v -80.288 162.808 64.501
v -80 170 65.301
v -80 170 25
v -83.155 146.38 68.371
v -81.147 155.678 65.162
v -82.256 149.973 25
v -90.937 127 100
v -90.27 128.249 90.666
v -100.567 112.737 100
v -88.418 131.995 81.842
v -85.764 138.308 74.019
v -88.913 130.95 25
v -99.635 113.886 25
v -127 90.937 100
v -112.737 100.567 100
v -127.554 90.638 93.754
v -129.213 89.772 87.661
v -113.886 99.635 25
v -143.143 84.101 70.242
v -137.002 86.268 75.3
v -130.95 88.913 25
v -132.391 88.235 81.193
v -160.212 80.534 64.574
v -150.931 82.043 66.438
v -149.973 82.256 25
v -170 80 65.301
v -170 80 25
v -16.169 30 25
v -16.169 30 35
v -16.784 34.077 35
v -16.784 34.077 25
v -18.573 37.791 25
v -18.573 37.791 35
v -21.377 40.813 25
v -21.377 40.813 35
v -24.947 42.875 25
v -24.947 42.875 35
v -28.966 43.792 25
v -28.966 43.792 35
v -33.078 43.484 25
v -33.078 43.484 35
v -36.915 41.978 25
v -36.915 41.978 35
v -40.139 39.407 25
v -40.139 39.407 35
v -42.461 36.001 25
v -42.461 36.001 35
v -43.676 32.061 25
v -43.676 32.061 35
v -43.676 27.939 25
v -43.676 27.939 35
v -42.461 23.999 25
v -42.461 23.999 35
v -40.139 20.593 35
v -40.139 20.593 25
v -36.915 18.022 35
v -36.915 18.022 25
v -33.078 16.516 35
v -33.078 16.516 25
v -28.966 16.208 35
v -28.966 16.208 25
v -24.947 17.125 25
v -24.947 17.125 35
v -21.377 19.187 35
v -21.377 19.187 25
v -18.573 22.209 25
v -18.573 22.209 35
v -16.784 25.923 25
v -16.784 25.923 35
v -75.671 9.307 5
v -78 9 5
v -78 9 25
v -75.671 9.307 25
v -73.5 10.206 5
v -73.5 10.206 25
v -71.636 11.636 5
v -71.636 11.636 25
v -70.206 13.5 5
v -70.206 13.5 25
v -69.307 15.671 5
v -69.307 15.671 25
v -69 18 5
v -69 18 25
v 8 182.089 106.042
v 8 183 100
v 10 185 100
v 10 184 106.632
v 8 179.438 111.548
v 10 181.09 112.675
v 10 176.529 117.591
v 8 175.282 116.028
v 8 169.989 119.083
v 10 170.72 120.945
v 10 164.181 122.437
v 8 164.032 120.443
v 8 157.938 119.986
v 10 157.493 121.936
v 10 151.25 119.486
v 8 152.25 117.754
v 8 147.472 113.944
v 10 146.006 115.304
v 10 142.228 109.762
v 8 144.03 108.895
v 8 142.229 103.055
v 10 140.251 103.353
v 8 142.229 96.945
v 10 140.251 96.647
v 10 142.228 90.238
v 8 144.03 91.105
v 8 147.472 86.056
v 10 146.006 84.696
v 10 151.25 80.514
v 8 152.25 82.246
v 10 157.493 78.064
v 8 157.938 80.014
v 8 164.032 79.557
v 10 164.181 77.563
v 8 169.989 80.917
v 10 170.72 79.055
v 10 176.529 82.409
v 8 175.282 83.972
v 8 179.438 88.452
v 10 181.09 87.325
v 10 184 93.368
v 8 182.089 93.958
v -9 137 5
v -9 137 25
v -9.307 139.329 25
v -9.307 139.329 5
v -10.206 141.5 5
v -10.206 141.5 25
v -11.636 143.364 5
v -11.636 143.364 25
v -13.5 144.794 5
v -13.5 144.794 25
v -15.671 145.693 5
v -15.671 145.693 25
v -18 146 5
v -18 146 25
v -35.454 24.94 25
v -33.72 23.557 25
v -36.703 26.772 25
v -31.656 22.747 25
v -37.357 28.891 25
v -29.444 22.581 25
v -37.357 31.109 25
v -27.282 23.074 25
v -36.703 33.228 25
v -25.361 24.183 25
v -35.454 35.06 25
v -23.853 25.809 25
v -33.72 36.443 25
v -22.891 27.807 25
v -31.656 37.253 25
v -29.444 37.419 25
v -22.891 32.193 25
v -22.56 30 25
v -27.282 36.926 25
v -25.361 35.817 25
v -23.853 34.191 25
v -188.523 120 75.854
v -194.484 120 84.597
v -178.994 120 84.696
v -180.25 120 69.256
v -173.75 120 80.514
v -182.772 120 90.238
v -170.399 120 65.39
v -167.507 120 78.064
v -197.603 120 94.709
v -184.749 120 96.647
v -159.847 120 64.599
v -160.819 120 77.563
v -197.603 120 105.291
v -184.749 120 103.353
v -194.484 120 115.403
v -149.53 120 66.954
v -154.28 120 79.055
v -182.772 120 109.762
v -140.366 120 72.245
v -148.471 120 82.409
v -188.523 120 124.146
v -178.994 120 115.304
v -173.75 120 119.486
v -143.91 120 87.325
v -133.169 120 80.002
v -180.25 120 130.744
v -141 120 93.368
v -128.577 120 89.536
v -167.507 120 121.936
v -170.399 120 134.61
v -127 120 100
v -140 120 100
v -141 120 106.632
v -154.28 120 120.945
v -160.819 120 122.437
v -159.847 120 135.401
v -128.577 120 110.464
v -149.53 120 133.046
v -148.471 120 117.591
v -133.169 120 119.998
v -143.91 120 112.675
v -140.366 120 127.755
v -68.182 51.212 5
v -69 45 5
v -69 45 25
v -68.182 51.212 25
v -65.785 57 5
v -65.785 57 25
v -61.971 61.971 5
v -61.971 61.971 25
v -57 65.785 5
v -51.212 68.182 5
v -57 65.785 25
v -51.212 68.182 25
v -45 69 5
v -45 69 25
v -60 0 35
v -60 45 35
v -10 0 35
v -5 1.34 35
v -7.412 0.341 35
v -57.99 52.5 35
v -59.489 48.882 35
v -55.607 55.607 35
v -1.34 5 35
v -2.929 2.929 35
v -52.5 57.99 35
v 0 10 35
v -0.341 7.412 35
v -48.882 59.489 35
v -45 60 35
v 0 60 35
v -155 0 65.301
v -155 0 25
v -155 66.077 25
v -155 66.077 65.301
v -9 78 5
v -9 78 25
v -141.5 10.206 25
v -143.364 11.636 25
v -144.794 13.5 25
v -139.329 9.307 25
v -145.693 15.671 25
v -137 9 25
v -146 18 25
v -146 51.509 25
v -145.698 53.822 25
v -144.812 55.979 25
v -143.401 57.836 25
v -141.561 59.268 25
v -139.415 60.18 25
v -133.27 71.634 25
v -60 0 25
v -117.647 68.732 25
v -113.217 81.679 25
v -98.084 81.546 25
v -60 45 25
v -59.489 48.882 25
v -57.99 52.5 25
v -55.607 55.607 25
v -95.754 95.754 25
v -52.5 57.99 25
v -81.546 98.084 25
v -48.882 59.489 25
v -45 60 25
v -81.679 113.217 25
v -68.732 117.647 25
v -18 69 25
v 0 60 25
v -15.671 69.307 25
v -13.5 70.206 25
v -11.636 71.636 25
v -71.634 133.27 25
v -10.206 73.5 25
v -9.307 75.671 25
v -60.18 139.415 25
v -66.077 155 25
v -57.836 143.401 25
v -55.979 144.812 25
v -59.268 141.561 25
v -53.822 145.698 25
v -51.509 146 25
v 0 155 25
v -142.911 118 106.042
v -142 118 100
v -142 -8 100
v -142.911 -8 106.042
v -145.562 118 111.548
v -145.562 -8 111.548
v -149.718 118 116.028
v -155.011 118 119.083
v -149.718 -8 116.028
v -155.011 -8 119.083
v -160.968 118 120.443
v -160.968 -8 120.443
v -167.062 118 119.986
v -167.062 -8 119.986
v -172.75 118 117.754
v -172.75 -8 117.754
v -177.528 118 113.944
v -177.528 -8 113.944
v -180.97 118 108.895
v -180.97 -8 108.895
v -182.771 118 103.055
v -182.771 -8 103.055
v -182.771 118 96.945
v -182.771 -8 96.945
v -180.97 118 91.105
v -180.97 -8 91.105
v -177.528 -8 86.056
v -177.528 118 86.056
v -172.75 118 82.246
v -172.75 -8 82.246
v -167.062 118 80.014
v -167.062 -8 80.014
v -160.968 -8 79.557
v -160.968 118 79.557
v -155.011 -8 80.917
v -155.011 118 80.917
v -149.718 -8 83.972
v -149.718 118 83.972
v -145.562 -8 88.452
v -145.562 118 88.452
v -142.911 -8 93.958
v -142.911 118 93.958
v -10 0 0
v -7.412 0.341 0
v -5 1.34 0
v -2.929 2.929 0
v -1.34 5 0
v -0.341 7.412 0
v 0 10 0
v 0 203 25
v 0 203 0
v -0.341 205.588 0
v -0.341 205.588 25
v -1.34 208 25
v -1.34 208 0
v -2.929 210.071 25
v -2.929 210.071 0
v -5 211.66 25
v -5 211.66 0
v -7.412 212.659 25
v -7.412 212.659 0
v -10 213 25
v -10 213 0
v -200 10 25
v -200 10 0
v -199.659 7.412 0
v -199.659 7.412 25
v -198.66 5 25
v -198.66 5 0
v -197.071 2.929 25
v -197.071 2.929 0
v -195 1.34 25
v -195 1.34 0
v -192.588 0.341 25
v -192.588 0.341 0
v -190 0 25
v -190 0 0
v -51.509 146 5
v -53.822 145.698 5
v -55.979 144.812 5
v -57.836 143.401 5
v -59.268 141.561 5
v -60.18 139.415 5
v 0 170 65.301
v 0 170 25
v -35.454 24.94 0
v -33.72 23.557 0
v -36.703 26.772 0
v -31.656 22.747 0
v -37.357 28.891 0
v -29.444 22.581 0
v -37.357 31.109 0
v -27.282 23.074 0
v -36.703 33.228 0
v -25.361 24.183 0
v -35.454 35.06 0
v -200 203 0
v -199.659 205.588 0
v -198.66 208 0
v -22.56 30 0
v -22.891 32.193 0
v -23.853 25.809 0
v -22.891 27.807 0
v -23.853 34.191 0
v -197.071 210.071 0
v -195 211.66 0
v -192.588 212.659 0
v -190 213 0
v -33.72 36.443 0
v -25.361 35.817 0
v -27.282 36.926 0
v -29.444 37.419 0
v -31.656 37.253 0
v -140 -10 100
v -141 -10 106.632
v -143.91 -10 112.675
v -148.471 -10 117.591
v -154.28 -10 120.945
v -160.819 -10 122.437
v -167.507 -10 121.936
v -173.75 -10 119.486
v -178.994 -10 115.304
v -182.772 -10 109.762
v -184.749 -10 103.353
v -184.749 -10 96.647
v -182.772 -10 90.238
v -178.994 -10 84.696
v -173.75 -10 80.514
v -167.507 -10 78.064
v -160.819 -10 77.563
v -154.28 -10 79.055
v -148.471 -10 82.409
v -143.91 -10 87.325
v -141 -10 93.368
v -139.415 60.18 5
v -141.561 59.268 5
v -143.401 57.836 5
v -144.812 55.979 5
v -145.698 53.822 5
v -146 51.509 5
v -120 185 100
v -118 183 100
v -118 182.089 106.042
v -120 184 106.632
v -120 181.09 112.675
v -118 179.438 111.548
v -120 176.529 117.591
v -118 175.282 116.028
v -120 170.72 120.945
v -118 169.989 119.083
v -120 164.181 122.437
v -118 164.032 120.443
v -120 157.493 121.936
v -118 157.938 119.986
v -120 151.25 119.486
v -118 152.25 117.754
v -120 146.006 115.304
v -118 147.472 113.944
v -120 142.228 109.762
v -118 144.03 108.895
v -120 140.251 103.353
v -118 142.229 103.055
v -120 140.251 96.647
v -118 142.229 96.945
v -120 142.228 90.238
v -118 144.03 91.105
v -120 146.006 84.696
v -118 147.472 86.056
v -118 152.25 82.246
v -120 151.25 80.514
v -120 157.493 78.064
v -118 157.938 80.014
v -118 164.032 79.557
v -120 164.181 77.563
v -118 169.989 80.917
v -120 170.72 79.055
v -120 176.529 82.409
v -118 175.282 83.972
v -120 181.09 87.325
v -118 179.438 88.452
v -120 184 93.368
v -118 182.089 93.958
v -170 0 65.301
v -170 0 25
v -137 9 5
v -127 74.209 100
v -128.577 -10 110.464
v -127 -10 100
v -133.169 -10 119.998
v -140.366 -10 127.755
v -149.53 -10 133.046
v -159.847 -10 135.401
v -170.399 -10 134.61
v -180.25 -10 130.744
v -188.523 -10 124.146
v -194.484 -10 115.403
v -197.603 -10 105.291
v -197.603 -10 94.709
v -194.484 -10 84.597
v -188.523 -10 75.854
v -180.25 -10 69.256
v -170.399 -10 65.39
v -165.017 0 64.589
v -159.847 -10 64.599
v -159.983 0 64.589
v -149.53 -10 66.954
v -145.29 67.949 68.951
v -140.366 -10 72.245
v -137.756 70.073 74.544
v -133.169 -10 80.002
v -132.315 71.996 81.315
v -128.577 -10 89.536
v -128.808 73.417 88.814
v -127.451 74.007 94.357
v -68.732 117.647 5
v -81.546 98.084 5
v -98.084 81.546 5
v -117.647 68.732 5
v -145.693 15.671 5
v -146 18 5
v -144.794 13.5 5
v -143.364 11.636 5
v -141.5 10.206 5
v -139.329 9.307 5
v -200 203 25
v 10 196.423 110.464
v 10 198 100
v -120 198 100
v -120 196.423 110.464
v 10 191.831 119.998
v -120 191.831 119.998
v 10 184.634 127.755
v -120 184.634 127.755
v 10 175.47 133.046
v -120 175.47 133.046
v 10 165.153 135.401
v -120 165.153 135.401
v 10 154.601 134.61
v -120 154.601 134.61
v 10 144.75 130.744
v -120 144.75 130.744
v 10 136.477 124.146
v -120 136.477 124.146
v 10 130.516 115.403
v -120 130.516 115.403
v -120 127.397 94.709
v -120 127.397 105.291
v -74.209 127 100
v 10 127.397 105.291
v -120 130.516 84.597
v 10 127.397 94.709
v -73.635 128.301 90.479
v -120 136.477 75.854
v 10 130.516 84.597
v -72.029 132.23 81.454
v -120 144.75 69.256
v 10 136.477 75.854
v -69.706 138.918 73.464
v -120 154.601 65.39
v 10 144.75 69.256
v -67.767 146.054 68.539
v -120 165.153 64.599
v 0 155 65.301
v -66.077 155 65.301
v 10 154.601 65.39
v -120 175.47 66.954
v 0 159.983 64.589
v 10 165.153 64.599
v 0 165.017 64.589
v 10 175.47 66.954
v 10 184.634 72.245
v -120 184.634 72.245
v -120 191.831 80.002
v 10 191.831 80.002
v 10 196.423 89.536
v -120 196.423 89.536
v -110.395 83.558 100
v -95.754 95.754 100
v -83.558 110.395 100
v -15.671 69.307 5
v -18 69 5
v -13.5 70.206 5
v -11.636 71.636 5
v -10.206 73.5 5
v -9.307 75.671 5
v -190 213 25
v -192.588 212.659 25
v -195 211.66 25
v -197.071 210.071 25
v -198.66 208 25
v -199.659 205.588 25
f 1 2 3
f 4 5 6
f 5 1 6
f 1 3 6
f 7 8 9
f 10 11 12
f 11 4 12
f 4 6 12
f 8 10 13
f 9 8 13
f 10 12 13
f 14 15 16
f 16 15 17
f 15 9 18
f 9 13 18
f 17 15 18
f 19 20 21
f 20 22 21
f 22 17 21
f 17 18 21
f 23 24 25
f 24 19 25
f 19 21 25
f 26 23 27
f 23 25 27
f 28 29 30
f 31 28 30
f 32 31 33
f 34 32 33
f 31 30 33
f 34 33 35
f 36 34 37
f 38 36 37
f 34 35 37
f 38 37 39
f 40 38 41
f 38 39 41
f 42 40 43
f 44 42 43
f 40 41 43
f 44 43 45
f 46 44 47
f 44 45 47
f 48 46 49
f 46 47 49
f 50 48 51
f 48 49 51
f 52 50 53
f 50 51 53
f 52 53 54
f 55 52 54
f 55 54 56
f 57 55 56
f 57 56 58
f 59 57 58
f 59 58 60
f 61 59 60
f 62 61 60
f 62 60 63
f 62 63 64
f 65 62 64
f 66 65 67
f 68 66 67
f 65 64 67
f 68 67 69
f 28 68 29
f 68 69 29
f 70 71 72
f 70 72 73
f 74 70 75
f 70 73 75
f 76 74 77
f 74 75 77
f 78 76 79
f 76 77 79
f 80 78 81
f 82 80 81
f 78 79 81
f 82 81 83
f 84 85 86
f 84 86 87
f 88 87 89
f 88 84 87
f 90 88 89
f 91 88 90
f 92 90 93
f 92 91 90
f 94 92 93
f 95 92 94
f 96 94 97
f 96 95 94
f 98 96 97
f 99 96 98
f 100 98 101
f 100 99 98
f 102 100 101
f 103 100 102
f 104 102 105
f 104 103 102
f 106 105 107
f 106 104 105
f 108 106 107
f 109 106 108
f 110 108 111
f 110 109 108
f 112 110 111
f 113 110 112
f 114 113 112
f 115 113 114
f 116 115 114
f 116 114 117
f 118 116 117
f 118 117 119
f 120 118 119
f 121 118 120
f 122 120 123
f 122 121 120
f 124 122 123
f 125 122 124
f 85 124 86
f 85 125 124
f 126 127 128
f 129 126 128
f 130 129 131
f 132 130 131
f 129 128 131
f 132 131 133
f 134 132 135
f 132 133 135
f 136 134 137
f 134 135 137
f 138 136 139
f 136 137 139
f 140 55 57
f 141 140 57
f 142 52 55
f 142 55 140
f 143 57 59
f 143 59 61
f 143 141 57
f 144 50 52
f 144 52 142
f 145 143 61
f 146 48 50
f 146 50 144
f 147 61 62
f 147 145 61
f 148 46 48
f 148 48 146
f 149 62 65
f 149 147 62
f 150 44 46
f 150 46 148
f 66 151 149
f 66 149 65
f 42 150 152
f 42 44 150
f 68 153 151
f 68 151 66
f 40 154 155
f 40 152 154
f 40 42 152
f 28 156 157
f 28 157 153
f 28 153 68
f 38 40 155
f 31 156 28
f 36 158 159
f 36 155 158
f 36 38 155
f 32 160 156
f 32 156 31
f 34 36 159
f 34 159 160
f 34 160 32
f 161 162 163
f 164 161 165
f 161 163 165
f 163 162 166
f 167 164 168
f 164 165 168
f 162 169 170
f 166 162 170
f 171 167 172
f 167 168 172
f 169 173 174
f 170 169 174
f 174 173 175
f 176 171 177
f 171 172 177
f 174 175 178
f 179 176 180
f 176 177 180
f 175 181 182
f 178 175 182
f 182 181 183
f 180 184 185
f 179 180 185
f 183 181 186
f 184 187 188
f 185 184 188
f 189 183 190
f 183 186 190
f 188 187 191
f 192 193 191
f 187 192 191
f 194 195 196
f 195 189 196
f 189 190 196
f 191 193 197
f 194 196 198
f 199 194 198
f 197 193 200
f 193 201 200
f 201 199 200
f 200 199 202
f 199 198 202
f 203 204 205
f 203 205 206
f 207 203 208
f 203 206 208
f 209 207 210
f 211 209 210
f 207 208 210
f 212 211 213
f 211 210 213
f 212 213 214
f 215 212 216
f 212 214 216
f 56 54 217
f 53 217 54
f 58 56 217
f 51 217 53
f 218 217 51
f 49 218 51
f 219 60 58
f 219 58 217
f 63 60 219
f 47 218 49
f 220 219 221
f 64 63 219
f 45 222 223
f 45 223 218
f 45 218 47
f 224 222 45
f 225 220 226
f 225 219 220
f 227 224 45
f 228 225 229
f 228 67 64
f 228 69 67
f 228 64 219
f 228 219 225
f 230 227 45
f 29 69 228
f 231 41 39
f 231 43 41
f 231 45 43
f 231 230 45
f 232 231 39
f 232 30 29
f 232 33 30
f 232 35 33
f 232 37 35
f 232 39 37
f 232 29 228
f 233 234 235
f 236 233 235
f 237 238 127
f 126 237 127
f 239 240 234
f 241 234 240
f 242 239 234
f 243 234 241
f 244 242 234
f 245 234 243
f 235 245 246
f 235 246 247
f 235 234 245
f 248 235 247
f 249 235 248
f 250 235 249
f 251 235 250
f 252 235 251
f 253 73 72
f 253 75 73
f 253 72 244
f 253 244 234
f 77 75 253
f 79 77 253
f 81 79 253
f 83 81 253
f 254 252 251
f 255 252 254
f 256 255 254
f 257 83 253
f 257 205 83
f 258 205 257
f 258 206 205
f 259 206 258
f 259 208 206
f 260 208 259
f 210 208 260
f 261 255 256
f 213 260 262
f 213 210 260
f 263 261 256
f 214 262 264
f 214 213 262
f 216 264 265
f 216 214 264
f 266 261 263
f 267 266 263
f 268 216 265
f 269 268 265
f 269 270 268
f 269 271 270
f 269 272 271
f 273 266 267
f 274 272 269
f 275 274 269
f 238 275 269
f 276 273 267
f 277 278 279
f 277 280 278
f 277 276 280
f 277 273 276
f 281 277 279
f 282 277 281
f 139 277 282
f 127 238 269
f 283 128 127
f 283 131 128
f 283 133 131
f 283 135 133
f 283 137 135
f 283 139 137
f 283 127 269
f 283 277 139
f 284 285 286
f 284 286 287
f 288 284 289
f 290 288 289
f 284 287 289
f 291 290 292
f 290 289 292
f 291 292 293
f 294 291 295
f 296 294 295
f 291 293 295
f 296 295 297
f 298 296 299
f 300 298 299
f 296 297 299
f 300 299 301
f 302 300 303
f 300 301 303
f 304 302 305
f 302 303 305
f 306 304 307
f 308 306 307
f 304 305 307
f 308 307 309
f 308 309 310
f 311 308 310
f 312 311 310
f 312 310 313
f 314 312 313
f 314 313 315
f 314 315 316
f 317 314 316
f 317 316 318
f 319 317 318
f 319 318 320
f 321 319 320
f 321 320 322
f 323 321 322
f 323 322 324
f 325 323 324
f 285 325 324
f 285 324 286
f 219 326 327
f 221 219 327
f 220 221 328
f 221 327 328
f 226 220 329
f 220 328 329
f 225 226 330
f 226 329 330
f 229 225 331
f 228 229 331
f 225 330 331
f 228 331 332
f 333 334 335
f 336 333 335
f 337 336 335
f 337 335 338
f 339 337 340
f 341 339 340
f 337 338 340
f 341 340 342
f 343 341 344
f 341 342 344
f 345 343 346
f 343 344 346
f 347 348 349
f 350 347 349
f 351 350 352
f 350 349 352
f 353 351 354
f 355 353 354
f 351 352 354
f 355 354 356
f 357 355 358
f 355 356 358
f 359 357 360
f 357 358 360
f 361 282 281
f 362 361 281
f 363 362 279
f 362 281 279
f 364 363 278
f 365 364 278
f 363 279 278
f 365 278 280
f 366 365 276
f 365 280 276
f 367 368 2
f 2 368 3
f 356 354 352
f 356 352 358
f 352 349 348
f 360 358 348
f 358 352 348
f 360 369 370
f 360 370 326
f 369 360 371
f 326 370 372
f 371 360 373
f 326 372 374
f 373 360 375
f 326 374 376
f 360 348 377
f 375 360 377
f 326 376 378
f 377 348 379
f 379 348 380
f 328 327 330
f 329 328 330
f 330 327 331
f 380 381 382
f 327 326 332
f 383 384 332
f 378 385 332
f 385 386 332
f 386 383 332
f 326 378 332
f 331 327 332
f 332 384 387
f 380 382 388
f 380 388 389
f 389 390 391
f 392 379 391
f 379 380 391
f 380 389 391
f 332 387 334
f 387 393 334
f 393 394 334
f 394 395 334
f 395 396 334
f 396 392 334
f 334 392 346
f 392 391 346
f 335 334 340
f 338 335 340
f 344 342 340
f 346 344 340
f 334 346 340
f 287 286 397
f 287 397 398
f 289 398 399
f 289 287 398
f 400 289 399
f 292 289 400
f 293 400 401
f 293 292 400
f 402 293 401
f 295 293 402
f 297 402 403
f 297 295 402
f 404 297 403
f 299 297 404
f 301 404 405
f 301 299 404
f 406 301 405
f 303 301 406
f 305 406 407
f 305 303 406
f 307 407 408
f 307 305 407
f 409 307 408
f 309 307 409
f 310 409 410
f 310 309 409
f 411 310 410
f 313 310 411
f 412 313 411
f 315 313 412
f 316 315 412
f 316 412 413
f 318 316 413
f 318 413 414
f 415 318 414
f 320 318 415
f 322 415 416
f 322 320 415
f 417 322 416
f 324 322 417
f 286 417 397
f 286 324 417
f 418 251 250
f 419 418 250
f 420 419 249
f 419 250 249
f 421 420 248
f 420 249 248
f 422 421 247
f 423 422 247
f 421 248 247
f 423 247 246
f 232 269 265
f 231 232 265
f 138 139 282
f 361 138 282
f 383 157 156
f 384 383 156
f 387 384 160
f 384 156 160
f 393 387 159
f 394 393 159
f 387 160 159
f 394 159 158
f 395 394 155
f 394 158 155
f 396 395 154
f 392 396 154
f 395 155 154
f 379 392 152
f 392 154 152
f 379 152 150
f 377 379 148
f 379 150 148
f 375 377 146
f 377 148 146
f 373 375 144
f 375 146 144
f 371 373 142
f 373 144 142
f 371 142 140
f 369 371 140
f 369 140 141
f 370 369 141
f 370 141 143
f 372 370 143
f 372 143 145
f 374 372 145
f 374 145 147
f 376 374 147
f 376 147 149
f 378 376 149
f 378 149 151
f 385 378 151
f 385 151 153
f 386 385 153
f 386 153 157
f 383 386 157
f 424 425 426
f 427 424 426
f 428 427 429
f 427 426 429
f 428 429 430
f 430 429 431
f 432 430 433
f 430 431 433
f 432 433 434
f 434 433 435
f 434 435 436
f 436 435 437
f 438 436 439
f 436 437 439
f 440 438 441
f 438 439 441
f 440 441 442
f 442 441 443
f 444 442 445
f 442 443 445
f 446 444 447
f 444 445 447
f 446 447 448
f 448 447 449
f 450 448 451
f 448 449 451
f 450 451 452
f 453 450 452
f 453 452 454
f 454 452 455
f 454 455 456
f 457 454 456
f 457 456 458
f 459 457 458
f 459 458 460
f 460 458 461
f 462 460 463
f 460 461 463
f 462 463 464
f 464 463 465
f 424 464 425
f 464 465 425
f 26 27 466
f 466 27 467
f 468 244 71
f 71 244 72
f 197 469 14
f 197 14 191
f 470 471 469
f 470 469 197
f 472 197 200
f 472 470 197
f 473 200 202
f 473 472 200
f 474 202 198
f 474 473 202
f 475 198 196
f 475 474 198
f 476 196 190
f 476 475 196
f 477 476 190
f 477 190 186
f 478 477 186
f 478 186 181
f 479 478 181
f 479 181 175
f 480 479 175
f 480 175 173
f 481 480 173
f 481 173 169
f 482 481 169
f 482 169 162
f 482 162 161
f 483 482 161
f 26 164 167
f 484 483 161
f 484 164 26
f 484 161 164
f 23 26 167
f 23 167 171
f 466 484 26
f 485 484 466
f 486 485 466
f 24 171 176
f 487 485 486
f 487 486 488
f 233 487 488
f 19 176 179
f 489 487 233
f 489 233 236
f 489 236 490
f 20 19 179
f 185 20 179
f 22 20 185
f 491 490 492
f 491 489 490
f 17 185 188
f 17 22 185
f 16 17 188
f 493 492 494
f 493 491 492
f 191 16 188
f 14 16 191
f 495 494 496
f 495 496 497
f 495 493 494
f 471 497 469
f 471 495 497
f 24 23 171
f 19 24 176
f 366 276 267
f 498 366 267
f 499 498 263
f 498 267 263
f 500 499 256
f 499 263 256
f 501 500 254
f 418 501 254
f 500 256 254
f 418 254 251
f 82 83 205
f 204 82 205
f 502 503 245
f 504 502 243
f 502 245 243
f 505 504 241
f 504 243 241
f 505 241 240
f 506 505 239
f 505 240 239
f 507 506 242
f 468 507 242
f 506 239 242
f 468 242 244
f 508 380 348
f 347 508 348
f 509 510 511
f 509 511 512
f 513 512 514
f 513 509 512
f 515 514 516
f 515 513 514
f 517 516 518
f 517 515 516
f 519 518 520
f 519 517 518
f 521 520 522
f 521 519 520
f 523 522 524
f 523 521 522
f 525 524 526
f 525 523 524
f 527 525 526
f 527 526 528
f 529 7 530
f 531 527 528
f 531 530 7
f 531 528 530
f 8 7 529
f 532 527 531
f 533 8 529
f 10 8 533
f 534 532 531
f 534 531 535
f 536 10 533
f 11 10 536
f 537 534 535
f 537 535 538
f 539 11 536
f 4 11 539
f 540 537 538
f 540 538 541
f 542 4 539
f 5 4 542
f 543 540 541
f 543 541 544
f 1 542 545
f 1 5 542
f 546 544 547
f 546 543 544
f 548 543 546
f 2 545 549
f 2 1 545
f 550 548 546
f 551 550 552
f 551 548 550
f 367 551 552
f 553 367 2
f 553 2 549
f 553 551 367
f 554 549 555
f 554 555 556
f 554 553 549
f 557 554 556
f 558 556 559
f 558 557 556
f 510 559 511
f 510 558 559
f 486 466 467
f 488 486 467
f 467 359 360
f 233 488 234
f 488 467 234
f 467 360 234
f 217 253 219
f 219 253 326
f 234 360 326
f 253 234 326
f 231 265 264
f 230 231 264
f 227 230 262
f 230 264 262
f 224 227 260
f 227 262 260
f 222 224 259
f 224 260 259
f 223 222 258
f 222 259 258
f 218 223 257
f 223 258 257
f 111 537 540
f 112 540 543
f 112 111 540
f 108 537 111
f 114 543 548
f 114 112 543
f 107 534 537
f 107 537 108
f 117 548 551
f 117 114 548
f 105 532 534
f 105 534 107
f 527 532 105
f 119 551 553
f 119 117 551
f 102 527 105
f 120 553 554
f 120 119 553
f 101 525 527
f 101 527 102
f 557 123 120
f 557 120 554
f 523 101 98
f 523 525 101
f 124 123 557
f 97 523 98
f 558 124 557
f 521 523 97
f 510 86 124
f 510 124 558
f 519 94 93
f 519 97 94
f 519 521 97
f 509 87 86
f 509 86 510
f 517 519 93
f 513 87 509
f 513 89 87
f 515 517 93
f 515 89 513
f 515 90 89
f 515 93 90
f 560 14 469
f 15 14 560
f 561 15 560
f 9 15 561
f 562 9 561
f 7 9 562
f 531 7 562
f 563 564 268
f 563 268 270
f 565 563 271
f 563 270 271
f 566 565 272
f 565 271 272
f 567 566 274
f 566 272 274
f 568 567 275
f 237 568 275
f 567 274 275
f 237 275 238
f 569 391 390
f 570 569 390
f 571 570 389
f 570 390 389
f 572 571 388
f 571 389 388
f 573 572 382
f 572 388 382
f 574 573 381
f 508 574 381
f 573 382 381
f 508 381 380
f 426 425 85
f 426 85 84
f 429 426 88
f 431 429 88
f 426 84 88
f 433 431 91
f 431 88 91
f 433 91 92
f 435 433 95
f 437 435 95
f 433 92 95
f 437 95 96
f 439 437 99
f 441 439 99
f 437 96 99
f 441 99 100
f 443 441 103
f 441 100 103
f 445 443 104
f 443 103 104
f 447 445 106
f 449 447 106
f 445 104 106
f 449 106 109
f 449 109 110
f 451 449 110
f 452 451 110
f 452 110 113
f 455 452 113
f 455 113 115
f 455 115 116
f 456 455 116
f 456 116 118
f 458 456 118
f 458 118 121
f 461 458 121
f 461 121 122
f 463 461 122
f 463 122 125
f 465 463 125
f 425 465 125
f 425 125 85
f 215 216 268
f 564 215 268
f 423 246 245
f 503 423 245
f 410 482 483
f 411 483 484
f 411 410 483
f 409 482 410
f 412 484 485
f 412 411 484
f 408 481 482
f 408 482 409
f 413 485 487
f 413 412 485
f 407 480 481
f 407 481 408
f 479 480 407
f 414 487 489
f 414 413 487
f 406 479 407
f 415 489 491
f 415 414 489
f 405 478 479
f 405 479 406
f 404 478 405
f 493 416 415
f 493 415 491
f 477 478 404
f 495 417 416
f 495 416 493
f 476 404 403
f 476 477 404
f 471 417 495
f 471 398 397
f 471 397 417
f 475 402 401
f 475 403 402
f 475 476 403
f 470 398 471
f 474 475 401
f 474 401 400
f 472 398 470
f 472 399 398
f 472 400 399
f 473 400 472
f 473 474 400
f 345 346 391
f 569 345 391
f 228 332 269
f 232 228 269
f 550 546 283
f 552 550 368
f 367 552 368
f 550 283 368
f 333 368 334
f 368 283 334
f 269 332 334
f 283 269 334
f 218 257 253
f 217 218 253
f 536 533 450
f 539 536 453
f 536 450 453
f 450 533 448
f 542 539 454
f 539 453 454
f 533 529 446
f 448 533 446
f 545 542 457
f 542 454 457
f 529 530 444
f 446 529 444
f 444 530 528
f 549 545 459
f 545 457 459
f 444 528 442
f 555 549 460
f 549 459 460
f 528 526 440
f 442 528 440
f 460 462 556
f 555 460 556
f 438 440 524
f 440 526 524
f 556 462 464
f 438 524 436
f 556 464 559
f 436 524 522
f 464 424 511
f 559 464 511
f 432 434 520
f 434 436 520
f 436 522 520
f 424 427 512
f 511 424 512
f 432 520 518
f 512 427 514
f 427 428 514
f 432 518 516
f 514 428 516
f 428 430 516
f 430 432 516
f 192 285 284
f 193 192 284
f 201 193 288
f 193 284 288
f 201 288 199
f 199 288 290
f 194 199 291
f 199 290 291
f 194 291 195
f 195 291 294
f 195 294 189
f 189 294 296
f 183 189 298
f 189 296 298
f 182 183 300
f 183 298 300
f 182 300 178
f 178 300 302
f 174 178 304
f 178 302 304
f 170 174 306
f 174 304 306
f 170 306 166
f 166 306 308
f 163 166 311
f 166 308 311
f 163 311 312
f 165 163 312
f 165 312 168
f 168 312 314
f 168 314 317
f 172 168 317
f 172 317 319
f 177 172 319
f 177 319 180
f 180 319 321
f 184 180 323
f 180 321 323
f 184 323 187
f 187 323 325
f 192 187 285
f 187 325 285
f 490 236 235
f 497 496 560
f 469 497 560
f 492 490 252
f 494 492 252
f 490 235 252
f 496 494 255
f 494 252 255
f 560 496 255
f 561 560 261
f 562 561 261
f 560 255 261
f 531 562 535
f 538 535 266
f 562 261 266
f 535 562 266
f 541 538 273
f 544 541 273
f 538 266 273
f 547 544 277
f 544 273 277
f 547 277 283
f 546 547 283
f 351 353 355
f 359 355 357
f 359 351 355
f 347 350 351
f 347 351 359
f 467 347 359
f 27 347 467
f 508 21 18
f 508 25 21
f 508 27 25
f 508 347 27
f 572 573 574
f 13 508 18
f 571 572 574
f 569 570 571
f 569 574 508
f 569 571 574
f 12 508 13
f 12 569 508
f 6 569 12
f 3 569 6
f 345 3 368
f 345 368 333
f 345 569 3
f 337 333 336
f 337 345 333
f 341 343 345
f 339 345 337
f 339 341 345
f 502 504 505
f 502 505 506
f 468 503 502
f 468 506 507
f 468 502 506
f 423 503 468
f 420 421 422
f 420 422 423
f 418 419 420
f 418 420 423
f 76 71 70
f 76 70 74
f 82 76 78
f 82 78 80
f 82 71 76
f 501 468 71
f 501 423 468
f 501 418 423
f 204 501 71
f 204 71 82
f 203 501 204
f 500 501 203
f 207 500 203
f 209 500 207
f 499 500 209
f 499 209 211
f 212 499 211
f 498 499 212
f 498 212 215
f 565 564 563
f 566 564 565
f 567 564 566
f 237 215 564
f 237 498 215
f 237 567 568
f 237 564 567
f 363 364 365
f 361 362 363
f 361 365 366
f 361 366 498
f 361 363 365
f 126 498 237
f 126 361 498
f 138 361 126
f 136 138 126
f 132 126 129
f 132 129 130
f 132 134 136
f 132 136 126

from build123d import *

# Parameters (mm, degrees)
F1_DEPTH  = 25
F3_DEPTH  = 75
F5_DEPTH  = 10
F7_R      = 13.8307060356
F7_R_2    = 7.44
F8_DEPTH  = 10
F9_DEPTH  = 35.001
F11_DEPTH = 20
F13_R     = 35.5
F14_DEPTH = 130
F15_R     = 20.5
F16_DEPTH = 223.001
F18_R     = 35.5
F19_DEPTH = 130
F20_R     = 20.5
F21_DEPTH = 210.001
F22_SIZE  = 2


with BuildPart() as f1:
    # F0 (on Top) → F1 (new body)
    with BuildSketch(Plane.XY):
        with BuildLine():
            Line((-190, 0), (-10, 0))
            ThreePointArc((-10, 0), (-2.9289321881, 2.9289321881), (0, 10))
            Line((0, 10), (0, 203))
            ThreePointArc((0, 203), (-2.9289321881, 210.0710678119), (-10, 213))
            Line((-10, 213), (-190, 213))
            ThreePointArc((-190, 213), (-197.0710678119, 210.0710678119), (-200, 203))
            Line((-200, 203), (-200, 10))
            ThreePointArc((-200, 10), (-197.0710678119, 2.9289321881), (-190, 0))
        make_face()
    extrude(amount=F1_DEPTH)

    # F2 (on face) → F3 (join)
    with BuildSketch(Plane.XY.offset(25)):
        with BuildLine():
            Line((0, 155.0000011921), (0, 170))
            Line((0, 170), (-80, 170))
            ThreePointArc((-80, 170), (-106.3603896932, 106.3603896932), (-170, 80))
            Line((-170, 80), (-170, 0))
            Line((-170, 0), (-155, 0))
            Line((-155, 0), (-155, 66.0769515459))
            ThreePointArc((-155, 66.0769515459), (-95.7537875496, 95.7537884012), (-66.0769513738, 155.0000011921))
            Line((-66.0769513738, 155.0000011921), (0, 155.0000011921))
        make_face()
    extrude(amount=F3_DEPTH)

    # F4 (on face) → F5 (join)
    with BuildSketch(Plane.XY.offset(25)):
        with BuildLine():
            Line((0, 60), (-45, 60))
            ThreePointArc((-45, 60), (-55.6066017178, 55.6066017178), (-60, 45))
            Line((-60, 45), (-60, 0))
            Line((-60, 0), (-10, 0))
            ThreePointArc((-10, 0), (-2.9289321881, 2.9289321881), (0, 10))
            Line((0, 10), (0, 60))
        make_face()
    extrude(amount=F5_DEPTH)

    # F7 (on face) → F8 (cut)
    with BuildSketch(Plane.XY.offset(35)):
        with Locations((-30, 30)):
            Circle(F7_R)
        with Locations((-30, 30)):
            Circle(F7_R_2, mode=Mode.SUBTRACT)
    extrude(amount=-F8_DEPTH, mode=Mode.SUBTRACT)

    # F7 (on face) → F9 (cut, through all)
    with BuildSketch(Plane.XY.offset(35)):
        with Locations((-30, 30)):
            Circle(F7_R_2)
    extrude(amount=-F9_DEPTH, mode=Mode.SUBTRACT)

    # F10 (on face) → F11 (cut)
    with BuildSketch(Plane.XY.offset(25)):
        with BuildLine():
            ThreePointArc((-78, 9), (-71.6360389693, 11.6360389693), (-69, 18))
            Line((-69, 18), (-69, 45))
            ThreePointArc((-69, 45), (-61.9705627485, 61.9705627485), (-45, 69))
            Line((-45, 69), (-18, 69))
            ThreePointArc((-18, 69), (-11.6360389693, 71.6360389693), (-9, 78))
            Line((-9, 78), (-9, 137.0000011921))
            ThreePointArc((-9, 137.0000011921), (-11.6360389693, 143.3639622228), (-18, 146.0000011921))
            Line((-18, 146.0000011921), (-51.5094937192, 146.0000011921))
            ThreePointArc((-51.5094937192, 146.0000011921), (-56.9532191654, 144.1669986991), (-60.1795307641, 139.4146352512))
            ThreePointArc((-60.1795307641, 139.4146352512), (-89.3898265392, 89.3898273502), (-139.4146341463, 60.1795310719))
            ThreePointArc((-139.4146341463, 60.1795310719), (-144.1669975344, 56.9532194614), (-146, 51.5094940512))
            Line((-146, 51.5094940512), (-146, 18))
            ThreePointArc((-146, 18), (-143.3639610307, 11.6360389693), (-137, 9))
            Line((-137, 9), (-78, 9))
        make_face()
    extrude(amount=-F11_DEPTH, mode=Mode.SUBTRACT)

    # F13 (on offset) → F14 (join)
    with BuildSketch(Plane.XZ.offset(10)):
        with Locations((-162.5, 100)):
            Circle(F13_R)
    extrude(amount=-F14_DEPTH)

    # F15 (on face) → F16 (cut, through all)
    with BuildSketch(Plane.XZ.offset(10)):
        with Locations((-162.5, 100)):
            Circle(F15_R)
    extrude(amount=-F16_DEPTH, mode=Mode.SUBTRACT)

    # F18 (on offset) → F19 (join)
    with BuildSketch(Plane.YZ.offset(10)):
        with Locations((162.5, 100)):
            Circle(F18_R)
    extrude(amount=-F19_DEPTH)

    # F20 (on face) → F21 (cut, through all)
    with BuildSketch(Plane.YZ.offset(10)):
        with Locations((162.5, 100)):
            Circle(F20_R)
    extrude(amount=-F21_DEPTH, mode=Mode.SUBTRACT)

    # F22
    f22_edges = [f1.edges().sort_by_distance(p)[0] for p in [
        (10, 142, 100),
        (-183, -10, 100),
        (-120, 142, 100),
        (-183, 120, 100),
    ]]
    chamfer(f22_edges, length=F22_SIZE)


solid = f1.part
